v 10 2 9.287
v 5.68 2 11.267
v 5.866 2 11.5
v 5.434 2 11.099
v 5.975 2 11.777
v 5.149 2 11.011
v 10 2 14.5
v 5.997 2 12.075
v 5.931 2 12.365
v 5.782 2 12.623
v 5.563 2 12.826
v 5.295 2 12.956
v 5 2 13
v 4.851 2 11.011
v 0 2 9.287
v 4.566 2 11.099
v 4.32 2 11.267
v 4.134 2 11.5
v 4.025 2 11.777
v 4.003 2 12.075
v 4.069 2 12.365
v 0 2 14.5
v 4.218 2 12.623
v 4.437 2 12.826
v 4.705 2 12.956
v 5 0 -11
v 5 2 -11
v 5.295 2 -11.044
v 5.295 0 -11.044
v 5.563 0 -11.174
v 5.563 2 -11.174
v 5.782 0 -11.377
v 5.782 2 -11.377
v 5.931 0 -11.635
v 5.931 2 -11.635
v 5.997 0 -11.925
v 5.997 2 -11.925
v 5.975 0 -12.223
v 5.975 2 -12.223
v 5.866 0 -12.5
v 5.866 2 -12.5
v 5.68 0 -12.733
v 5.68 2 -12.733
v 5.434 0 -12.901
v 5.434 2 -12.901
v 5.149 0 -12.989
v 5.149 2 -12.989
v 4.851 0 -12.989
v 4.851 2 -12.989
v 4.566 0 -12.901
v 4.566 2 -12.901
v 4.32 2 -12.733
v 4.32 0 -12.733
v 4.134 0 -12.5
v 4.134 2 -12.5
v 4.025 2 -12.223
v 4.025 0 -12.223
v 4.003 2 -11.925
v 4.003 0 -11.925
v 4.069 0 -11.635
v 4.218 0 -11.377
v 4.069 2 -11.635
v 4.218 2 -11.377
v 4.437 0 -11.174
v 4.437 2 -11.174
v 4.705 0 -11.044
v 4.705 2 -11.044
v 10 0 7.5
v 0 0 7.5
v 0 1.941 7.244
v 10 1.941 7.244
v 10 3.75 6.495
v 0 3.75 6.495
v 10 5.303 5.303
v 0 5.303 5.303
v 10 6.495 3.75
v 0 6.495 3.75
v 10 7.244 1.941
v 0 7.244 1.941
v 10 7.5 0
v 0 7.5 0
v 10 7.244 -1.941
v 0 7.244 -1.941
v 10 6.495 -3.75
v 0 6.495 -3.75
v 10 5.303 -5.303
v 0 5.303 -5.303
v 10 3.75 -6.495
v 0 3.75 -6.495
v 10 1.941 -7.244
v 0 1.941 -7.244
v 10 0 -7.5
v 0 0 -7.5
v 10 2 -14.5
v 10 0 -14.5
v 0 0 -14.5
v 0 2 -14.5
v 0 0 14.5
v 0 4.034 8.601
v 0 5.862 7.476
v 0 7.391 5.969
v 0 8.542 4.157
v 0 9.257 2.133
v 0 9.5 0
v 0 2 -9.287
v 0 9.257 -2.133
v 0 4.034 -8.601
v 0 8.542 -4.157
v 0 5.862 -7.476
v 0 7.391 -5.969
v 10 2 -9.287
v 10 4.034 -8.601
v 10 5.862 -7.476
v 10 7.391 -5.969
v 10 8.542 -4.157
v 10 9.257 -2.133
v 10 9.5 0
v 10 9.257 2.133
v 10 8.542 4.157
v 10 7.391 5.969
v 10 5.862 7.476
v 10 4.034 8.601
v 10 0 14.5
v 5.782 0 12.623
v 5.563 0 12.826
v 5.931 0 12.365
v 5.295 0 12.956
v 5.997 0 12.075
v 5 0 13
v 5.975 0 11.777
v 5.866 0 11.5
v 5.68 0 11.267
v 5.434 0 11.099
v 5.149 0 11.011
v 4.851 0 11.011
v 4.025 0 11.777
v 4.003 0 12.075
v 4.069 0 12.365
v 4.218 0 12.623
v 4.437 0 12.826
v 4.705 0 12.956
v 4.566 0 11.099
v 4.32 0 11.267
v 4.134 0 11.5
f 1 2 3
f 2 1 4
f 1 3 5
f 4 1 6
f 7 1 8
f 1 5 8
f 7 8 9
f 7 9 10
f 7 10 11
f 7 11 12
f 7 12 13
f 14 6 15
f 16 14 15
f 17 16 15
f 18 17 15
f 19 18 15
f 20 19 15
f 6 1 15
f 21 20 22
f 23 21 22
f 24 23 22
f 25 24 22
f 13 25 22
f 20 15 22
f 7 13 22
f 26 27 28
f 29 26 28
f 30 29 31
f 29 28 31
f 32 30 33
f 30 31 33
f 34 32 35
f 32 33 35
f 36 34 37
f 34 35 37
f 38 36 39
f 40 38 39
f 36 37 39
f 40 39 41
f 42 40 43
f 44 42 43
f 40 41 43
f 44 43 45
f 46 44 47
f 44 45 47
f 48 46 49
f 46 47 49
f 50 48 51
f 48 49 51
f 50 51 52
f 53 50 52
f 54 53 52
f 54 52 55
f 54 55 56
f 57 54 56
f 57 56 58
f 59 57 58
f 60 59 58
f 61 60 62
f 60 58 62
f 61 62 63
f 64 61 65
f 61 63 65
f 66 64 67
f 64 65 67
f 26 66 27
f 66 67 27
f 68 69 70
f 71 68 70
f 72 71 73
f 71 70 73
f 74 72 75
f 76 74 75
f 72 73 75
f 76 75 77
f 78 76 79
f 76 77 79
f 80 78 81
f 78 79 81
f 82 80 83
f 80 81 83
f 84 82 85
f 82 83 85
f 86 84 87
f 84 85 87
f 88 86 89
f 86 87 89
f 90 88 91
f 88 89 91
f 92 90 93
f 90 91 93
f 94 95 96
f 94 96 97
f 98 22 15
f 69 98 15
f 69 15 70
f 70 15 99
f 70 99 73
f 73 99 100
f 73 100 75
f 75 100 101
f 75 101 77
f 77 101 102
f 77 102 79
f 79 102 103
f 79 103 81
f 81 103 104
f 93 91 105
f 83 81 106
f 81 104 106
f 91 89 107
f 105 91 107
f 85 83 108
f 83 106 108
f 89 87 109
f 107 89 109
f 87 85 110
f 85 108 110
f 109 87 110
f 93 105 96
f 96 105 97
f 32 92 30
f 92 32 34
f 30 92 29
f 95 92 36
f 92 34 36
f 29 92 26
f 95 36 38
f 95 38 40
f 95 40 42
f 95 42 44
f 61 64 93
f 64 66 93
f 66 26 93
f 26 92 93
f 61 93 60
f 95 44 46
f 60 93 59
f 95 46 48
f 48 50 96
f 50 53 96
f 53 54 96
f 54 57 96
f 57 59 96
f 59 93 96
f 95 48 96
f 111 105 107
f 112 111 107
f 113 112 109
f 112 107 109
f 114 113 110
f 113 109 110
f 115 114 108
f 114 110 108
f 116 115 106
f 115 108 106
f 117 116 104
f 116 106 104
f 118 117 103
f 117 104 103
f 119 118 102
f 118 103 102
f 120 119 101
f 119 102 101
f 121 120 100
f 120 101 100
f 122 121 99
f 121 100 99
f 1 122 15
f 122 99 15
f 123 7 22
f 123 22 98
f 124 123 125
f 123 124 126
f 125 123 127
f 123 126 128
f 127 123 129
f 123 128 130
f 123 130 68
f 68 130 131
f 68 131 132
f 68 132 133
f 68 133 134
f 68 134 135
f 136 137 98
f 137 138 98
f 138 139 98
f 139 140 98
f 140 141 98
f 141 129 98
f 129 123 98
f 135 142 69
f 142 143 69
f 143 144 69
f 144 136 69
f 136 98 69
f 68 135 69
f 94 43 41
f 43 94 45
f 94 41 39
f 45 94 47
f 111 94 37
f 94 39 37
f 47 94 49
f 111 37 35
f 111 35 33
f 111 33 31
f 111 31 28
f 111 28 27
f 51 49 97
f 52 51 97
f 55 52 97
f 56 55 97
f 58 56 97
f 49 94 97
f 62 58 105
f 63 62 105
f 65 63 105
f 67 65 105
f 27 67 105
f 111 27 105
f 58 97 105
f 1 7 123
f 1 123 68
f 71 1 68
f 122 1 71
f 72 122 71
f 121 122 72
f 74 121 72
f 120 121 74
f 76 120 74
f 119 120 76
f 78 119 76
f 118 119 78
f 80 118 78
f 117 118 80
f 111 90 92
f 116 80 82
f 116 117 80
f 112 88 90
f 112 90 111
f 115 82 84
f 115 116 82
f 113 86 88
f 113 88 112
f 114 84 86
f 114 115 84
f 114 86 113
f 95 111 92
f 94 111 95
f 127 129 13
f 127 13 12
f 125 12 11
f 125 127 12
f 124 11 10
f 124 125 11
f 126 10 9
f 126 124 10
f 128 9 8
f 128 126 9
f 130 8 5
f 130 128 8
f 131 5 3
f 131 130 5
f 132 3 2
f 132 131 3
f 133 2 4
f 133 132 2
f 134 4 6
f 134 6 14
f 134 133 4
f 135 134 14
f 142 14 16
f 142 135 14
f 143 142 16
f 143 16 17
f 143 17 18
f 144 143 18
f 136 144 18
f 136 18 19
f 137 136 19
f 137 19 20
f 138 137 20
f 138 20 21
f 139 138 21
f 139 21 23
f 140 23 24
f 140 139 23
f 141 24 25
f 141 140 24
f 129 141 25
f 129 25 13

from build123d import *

# Parameters (mm, degrees)
BOSS_EXTRUDE1_DEPTH = 10
SKETCH2_R           = 1
CUT_EXTRUDE1_DEPTH  = 2
SKETCH3_R           = 1
CUT_EXTRUDE5_DEPTH  = 2


with BuildPart() as part:
    # Sketch1 → Boss-Extrude1 (new body)
    with BuildSketch(Plane(origin=(0, 0, 0), x_dir=(0, 0, -1), z_dir=(1, 0, 0))):
        with BuildLine():
            Line((7.5, 0), (14.5, 0))
            Line((14.5, 0), (14.5, 2))
            Line((14.5, 2), (9.287087811, 2))
            ThreePointArc((9.287087811, 2), (0, 9.5), (-9.287087811, 2))
            Line((-9.287087811, 2), (-14.5, 2))
            Line((-14.5, 2), (-14.5, 0))
            Line((-14.5, 0), (-7.5, 0))
            ThreePointArc((-7.5, 0), (0, 7.5), (7.5, 0))
        make_face()
    extrude(amount=BOSS_EXTRUDE1_DEPTH)

    # Sketch2 → Cut-Extrude1 (cut)
    with BuildSketch(Plane(origin=(0, 2, 0), x_dir=(1, 0, 0), z_dir=(0, 1, 0))):
        with Locations(Location((5, 12, 0), (0, 0, 270))):
            Circle(SKETCH2_R)
    extrude(amount=-CUT_EXTRUDE1_DEPTH, mode=Mode.SUBTRACT)

    # Sketch3 → Cut-Extrude5 (cut)
    with BuildSketch(Plane(origin=(0, 0, 0), x_dir=(1, 0, 0), z_dir=(0, 1, 0))):
        with Locations(Location((5, -12, 0), (0, 0, 270))):
            Circle(SKETCH3_R)
    extrude(amount=CUT_EXTRUDE5_DEPTH, mode=Mode.SUBTRACT)


solid = part.part
